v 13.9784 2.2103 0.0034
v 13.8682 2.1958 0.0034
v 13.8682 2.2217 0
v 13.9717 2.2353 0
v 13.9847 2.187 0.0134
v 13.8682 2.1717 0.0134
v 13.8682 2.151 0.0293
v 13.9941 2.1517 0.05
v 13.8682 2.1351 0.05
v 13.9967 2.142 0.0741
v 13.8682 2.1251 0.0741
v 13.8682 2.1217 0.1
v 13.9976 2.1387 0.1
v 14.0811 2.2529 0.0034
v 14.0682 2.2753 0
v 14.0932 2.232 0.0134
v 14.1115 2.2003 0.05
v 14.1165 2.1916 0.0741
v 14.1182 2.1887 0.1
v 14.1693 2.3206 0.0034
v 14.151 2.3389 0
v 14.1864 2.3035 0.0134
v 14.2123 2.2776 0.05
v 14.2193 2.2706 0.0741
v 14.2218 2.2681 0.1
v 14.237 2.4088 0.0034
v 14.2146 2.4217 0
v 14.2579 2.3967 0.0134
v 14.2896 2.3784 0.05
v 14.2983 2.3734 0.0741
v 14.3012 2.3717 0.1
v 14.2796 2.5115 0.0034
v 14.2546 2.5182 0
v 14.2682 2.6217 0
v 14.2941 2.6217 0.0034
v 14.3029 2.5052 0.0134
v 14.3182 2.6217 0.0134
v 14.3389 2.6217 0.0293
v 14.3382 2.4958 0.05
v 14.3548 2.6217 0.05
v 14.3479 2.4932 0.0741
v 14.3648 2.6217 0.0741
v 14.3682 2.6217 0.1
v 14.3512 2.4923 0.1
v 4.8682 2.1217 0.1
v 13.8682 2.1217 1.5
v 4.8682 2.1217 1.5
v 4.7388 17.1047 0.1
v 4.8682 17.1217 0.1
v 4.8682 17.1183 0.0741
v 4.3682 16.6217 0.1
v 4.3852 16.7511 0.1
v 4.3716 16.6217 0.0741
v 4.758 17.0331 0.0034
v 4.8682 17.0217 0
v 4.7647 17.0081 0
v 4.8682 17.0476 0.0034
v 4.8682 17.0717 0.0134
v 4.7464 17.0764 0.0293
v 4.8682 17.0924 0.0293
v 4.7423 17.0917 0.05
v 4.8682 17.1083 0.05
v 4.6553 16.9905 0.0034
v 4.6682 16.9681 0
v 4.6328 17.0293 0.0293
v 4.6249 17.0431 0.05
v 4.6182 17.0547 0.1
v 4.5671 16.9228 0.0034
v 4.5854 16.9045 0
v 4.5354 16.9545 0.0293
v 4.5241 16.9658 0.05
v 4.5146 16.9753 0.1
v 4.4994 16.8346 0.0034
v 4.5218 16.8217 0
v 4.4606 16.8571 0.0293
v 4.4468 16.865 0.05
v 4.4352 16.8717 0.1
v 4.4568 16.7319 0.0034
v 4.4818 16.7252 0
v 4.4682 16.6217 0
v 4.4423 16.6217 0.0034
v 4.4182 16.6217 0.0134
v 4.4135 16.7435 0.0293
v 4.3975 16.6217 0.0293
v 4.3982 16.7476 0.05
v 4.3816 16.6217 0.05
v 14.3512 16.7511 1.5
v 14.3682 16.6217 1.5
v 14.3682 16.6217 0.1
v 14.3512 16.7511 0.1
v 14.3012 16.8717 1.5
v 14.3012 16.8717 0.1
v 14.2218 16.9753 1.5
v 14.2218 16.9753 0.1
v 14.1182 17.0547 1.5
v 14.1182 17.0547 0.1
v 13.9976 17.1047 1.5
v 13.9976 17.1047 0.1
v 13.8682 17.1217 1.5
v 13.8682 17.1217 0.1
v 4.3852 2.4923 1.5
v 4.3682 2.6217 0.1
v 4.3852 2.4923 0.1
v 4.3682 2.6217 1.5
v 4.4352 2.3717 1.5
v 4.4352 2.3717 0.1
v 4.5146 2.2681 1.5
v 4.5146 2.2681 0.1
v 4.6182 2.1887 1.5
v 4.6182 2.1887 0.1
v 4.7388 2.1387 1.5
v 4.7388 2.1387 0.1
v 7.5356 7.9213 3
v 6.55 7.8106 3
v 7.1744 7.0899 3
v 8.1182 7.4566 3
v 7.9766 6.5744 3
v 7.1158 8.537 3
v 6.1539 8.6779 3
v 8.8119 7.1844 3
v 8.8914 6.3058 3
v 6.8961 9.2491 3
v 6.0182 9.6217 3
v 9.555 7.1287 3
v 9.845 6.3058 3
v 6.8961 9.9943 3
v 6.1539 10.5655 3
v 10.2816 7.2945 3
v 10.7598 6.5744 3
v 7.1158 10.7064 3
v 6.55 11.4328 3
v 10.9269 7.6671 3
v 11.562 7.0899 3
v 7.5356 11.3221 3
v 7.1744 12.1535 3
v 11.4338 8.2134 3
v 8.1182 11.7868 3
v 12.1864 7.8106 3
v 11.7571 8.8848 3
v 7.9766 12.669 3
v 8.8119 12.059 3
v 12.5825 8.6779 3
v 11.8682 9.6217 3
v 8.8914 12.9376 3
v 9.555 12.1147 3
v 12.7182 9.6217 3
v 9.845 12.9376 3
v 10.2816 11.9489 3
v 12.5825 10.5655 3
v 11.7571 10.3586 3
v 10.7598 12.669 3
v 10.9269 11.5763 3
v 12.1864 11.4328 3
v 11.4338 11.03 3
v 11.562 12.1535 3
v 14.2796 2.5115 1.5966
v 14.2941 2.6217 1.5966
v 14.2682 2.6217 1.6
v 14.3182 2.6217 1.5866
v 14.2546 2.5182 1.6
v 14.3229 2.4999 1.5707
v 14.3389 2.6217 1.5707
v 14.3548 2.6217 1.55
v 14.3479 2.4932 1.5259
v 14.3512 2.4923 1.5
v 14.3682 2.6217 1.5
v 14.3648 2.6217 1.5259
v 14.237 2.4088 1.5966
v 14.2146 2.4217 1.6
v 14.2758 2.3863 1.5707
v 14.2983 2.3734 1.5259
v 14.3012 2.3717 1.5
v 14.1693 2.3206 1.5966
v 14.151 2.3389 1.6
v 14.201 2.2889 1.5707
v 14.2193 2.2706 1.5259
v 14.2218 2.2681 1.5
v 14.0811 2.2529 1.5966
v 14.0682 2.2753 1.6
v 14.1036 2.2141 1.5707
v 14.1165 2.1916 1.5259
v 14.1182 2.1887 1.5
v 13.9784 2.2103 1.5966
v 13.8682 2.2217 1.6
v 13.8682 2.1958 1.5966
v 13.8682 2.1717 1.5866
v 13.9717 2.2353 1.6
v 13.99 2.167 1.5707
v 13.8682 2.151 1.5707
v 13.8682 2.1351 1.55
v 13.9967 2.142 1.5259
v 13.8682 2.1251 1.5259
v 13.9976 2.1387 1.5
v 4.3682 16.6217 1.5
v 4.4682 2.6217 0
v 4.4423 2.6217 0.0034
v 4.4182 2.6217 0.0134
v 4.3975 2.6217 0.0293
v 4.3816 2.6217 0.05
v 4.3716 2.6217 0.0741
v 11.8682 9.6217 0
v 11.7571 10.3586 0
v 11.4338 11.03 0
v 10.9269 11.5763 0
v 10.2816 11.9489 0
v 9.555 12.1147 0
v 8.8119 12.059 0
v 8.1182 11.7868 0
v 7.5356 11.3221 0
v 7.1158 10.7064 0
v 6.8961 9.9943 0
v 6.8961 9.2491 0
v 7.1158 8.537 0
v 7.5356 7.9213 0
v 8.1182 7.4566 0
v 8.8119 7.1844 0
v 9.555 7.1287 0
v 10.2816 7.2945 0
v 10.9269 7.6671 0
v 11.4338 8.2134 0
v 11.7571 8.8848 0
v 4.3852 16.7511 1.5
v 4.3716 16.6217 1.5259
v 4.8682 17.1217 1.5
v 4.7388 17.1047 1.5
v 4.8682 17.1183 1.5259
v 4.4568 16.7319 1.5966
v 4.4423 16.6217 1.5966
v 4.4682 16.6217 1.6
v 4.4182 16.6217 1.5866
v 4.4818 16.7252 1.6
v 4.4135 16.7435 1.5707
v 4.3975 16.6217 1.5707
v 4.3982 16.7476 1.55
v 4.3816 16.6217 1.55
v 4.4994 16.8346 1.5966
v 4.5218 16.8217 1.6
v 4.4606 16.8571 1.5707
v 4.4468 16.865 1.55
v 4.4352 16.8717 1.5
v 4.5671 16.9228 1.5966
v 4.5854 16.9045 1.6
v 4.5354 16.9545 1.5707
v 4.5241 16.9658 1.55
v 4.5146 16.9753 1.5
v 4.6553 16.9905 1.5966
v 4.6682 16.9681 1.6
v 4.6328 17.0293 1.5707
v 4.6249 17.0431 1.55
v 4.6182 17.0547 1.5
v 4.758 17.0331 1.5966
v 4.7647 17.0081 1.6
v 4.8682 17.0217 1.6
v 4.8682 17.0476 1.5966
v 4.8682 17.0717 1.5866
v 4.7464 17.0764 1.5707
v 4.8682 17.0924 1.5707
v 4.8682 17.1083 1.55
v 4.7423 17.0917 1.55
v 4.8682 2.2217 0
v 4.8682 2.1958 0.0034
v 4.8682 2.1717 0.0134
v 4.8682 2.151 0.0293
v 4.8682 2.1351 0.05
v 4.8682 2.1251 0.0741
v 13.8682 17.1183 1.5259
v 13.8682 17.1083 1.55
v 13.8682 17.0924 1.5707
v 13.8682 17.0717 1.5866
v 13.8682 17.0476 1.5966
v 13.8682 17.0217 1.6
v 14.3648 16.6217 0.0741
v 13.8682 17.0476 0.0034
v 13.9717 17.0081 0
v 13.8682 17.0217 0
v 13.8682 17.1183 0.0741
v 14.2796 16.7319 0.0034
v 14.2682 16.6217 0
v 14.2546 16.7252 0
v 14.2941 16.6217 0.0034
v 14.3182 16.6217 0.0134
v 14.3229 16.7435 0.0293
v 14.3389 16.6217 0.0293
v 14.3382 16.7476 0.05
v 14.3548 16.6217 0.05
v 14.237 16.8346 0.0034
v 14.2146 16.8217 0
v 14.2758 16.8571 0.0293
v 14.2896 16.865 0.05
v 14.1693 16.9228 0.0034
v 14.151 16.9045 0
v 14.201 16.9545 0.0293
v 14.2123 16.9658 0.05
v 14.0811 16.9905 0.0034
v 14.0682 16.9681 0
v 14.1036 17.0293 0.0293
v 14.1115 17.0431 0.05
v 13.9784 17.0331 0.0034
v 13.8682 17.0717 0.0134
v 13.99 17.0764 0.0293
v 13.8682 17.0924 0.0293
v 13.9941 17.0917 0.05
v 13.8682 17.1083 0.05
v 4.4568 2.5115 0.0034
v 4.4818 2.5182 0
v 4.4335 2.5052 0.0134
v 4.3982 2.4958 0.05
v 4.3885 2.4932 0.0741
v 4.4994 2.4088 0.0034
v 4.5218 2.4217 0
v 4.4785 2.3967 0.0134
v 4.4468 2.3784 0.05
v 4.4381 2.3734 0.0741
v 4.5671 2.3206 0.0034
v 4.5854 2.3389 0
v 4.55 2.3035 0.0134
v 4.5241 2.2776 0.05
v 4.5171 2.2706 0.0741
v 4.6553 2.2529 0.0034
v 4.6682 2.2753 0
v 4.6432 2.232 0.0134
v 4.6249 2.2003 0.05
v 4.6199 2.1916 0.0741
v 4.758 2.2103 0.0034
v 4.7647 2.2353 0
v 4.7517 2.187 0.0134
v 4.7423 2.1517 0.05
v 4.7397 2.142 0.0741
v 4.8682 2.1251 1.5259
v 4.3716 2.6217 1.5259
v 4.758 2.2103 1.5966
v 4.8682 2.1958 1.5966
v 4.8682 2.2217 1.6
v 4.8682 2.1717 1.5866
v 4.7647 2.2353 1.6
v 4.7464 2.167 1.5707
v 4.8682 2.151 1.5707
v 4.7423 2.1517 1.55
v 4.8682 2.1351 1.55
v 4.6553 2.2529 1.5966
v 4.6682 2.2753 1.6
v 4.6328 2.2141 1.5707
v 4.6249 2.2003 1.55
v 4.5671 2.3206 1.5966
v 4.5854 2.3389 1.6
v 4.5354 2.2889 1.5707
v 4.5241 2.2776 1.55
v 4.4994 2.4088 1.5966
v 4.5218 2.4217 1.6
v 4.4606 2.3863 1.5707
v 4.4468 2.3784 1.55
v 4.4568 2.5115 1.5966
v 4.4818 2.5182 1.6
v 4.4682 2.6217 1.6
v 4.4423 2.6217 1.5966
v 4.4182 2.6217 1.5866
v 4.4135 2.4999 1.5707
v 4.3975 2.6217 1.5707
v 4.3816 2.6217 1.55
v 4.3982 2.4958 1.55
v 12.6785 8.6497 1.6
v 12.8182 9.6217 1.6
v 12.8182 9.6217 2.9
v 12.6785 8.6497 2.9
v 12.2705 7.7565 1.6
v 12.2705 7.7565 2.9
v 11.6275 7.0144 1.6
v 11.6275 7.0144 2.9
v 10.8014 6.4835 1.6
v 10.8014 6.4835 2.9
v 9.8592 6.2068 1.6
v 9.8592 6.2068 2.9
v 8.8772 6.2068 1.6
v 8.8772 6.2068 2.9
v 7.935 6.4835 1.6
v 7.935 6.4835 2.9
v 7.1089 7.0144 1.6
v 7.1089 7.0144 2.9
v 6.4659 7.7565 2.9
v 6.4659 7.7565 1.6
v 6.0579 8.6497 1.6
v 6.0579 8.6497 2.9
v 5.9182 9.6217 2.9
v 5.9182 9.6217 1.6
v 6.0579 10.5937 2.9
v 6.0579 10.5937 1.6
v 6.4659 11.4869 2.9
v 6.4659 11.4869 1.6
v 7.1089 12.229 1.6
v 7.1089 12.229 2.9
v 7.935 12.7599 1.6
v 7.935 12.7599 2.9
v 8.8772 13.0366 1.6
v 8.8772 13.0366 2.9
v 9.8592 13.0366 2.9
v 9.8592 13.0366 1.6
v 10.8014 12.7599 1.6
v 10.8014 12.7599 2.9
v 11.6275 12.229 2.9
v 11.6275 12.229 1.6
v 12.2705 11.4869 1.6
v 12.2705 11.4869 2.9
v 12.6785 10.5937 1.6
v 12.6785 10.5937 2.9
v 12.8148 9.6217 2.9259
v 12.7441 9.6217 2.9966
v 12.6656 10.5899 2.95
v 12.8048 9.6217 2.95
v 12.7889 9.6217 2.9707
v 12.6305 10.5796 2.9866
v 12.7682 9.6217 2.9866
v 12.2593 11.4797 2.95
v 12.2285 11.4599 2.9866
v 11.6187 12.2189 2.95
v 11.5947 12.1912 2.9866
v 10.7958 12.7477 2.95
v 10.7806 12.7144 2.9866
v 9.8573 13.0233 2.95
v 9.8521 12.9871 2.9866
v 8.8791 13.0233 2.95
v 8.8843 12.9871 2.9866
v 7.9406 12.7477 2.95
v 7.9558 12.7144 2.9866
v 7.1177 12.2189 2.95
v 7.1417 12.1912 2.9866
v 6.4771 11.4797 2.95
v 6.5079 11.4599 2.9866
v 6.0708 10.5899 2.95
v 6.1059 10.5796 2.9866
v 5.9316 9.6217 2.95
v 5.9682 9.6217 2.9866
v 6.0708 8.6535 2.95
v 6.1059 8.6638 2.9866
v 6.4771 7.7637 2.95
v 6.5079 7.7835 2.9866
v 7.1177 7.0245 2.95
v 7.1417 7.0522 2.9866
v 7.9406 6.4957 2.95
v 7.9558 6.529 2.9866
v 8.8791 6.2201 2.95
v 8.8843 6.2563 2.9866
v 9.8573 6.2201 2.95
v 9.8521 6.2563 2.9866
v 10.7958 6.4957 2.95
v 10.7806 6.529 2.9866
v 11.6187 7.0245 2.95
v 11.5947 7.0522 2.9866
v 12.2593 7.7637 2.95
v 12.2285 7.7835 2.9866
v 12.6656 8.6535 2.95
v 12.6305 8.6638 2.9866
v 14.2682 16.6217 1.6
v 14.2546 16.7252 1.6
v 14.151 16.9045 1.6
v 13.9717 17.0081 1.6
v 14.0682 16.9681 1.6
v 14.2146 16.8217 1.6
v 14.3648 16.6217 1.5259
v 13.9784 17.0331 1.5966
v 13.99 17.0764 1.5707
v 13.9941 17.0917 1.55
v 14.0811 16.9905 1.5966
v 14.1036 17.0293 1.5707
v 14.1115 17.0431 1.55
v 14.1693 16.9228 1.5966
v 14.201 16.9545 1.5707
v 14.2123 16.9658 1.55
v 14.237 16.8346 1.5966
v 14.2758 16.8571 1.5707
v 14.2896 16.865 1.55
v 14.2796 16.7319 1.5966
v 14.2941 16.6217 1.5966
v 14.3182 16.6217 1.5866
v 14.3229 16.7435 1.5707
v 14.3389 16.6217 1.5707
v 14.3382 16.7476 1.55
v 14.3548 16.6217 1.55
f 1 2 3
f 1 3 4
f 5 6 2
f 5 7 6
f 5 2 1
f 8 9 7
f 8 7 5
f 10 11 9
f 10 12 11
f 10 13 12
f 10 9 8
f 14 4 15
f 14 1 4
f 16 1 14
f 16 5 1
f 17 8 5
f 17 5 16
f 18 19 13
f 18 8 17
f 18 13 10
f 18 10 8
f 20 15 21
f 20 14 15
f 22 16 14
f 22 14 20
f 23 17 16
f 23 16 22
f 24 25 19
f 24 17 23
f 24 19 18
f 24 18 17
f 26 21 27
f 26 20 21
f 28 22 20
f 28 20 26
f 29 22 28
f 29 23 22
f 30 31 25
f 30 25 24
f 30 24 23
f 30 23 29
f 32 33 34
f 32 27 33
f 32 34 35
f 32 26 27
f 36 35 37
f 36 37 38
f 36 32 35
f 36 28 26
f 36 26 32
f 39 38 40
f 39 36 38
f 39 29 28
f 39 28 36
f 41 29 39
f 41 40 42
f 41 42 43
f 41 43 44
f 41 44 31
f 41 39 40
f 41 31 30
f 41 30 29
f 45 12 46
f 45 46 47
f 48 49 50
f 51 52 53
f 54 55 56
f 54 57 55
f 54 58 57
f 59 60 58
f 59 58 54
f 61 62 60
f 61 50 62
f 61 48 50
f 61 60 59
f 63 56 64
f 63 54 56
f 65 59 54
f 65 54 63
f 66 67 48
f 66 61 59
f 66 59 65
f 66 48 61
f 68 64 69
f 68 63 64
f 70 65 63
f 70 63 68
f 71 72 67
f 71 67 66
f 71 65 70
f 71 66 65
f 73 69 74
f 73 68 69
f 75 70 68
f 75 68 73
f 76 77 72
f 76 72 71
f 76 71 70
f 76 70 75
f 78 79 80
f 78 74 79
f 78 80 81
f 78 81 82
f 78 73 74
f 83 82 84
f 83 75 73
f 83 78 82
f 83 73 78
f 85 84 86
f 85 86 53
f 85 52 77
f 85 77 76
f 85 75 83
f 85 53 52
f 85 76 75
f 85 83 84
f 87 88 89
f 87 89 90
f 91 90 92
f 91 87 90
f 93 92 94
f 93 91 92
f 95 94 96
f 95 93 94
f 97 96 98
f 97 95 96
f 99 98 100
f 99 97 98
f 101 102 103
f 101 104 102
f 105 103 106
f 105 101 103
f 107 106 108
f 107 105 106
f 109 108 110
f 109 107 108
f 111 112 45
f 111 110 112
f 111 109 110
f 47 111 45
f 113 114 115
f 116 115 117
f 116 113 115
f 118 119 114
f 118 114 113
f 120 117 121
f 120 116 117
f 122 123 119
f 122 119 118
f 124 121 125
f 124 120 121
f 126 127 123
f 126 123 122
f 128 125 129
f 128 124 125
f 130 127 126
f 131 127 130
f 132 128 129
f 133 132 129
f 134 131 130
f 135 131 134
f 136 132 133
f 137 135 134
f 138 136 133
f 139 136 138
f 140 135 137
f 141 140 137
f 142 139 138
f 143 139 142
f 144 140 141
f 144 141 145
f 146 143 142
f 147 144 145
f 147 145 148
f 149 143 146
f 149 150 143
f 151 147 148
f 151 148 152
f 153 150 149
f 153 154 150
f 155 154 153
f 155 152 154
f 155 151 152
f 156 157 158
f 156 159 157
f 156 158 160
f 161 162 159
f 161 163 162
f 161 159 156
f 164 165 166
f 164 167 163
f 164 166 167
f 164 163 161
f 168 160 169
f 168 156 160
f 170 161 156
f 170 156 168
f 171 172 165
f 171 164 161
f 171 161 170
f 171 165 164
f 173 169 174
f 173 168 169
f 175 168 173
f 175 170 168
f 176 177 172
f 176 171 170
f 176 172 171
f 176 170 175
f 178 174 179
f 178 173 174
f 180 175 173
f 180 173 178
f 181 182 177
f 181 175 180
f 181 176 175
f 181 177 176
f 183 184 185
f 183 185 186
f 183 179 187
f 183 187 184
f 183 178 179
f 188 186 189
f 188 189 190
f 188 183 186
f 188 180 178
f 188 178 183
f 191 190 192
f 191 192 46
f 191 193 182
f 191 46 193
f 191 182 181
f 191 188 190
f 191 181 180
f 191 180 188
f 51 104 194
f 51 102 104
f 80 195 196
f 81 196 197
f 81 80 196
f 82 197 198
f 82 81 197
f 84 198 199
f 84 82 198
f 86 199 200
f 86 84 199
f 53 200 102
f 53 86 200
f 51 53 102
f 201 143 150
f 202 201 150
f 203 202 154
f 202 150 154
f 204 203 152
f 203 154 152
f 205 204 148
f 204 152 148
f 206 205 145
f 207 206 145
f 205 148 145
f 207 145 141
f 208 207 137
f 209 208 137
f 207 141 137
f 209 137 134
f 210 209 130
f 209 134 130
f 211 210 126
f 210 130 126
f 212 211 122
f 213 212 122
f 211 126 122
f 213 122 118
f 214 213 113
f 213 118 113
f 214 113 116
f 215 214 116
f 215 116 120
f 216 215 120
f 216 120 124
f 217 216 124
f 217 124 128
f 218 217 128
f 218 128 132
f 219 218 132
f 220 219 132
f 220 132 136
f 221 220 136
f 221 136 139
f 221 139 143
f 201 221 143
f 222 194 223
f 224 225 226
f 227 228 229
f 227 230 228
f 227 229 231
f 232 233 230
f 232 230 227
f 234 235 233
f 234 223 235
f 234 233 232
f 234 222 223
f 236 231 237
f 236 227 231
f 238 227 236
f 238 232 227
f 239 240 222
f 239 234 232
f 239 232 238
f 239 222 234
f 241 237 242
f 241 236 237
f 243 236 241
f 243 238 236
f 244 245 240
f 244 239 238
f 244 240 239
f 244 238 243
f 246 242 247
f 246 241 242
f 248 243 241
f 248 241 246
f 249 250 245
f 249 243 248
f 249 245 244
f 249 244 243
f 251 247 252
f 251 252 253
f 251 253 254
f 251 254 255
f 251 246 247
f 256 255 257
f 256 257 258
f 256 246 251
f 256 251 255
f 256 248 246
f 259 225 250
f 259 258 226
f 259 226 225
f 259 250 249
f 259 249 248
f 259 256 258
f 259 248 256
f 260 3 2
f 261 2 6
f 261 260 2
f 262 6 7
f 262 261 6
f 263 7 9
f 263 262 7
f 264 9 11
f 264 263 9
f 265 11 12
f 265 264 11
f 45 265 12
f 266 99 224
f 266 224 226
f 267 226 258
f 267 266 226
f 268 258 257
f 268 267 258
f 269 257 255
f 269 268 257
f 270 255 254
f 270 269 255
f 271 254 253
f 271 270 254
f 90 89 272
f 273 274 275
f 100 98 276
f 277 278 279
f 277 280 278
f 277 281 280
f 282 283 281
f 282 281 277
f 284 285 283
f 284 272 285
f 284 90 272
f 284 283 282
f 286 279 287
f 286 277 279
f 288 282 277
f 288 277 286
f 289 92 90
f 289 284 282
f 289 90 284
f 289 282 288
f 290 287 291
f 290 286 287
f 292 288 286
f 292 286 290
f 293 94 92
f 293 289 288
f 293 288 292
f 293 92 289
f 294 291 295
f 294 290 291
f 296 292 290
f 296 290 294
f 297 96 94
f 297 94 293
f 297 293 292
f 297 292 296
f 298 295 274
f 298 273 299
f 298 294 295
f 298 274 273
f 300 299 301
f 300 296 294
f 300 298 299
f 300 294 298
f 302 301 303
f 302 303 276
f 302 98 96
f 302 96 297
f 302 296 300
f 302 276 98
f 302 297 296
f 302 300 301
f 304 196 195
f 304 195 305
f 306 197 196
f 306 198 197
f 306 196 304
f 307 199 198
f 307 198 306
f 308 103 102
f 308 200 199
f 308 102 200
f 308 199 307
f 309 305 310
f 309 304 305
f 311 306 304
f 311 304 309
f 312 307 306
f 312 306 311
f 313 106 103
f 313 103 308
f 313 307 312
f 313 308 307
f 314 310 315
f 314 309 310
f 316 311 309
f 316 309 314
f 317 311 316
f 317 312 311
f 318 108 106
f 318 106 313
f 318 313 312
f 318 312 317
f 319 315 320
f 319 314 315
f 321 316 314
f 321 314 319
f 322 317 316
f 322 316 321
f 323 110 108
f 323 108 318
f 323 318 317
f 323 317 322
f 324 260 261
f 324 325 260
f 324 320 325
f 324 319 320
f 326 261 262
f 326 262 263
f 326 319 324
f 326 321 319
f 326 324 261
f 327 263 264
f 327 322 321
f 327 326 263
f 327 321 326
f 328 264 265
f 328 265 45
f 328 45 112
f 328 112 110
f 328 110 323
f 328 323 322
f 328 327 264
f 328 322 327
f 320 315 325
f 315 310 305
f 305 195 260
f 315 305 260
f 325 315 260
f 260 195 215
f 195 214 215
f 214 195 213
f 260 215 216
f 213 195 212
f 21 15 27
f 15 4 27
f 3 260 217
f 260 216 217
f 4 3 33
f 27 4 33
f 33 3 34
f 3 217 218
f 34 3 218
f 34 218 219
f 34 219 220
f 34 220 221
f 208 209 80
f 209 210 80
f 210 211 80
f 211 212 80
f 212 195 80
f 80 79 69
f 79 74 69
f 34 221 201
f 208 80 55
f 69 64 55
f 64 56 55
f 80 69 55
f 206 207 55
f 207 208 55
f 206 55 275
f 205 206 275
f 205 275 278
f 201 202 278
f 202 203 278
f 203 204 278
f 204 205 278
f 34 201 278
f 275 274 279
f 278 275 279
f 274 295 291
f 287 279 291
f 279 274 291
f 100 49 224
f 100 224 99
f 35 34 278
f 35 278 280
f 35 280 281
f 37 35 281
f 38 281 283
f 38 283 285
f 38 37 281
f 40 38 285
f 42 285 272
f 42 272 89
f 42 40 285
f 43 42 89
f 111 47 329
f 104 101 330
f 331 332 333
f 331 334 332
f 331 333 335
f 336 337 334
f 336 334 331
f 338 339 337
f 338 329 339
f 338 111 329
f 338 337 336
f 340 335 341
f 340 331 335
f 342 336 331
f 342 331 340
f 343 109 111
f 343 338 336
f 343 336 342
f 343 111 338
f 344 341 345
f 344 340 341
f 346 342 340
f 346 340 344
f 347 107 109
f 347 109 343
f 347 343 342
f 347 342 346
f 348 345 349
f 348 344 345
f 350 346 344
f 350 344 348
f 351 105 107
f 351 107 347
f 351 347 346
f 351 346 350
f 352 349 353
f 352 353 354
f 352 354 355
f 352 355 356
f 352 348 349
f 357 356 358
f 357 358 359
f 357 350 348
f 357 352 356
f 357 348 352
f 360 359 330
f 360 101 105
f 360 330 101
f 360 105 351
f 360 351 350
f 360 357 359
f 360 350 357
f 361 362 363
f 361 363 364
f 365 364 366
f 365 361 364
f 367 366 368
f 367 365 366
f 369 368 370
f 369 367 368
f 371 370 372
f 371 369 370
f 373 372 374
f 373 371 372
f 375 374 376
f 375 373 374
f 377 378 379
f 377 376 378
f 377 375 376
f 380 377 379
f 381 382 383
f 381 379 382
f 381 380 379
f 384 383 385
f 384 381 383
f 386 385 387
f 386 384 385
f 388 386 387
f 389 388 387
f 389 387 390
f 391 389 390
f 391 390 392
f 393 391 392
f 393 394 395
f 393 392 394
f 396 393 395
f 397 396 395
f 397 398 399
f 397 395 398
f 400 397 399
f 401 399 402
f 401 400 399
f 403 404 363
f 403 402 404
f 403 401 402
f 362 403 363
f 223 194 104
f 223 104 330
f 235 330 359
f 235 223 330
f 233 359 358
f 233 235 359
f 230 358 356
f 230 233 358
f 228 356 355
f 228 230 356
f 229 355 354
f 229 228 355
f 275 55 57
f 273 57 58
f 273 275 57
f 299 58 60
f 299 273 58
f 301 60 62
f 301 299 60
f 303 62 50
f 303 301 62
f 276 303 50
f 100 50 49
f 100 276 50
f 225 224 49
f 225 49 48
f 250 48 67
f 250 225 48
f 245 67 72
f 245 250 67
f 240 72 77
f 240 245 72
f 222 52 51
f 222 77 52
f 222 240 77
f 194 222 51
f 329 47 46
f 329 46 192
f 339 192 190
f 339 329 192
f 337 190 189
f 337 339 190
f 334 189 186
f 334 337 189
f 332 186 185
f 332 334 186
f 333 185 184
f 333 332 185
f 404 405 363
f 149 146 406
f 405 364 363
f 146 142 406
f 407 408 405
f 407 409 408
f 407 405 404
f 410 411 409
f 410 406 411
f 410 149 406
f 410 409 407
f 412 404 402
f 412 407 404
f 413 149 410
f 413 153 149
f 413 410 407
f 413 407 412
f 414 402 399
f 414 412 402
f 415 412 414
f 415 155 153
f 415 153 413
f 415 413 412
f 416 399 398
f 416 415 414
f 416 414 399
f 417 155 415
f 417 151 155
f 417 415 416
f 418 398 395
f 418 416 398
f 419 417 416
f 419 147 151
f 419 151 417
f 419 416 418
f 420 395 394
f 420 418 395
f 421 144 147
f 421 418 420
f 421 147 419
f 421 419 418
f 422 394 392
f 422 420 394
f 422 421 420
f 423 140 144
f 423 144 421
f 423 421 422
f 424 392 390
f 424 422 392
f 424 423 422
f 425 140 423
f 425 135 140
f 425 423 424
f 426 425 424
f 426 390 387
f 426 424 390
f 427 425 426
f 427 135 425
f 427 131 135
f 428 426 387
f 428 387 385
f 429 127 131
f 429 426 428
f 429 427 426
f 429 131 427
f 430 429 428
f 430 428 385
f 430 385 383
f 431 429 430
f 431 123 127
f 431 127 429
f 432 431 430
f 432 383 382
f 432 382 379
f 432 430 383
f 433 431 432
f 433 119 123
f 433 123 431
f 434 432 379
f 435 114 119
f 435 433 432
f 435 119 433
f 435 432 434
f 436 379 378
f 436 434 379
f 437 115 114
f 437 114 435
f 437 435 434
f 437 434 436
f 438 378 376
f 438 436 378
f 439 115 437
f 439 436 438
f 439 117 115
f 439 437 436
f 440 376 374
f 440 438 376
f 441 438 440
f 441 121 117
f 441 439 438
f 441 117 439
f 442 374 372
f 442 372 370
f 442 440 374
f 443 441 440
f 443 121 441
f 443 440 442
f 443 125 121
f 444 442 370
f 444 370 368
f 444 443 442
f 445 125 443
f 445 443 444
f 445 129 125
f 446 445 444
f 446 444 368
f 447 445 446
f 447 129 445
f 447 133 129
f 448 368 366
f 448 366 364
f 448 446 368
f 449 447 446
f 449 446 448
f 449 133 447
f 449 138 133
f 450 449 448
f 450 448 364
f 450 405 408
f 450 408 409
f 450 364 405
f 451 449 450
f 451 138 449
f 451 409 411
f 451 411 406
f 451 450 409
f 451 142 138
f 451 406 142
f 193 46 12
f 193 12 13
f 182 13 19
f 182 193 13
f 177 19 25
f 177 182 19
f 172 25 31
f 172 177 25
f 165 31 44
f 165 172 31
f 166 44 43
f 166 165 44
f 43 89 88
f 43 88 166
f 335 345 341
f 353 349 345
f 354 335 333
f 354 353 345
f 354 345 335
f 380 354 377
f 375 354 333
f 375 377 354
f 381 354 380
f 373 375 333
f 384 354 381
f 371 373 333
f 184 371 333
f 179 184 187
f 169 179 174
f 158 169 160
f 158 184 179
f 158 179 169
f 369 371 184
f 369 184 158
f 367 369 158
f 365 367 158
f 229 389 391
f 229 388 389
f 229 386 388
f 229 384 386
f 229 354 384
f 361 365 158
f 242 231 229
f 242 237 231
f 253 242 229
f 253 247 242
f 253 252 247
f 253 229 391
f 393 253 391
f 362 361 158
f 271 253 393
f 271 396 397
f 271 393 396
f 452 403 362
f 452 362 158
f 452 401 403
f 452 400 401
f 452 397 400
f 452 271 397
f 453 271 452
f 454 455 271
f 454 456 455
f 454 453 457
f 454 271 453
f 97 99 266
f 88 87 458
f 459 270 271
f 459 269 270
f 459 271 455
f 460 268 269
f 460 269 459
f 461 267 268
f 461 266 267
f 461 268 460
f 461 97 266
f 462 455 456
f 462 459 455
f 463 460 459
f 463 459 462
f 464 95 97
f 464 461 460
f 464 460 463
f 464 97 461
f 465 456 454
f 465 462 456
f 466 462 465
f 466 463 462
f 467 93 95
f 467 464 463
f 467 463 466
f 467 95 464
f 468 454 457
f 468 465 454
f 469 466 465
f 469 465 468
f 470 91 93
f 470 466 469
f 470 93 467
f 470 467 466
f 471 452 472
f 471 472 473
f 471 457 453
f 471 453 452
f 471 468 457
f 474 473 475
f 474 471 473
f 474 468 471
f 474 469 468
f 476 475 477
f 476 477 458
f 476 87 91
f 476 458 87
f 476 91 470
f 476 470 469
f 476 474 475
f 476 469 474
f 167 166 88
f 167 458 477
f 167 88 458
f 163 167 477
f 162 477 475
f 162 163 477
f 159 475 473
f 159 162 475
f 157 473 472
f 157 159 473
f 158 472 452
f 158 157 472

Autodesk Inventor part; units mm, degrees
ref_plane "YZ Plane" through (0, 0, 0) normal (1, 0, 0) x (0, 1, 0)
ref_plane "XZ Plane" through (0, 0, 0) normal (0, 1, 0) x (-1, 0, 0)
ref_plane "XY Plane" through (0, 0, 0) normal (0, 0, 1) x (1, 0, 0)
sketch "Sketch1" plane through (0, 0, 0) normal (0, 0, 1) x (1, 0, 0)
  line L0 (4.3682, 17.1217) -> (14.3682, 17.1217)
  line L1 (14.3682, 17.1217) -> (14.3682, 2.1217)
  line L2 (14.3682, 2.1217) -> (4.3682, 2.1217)
  line L3 (4.3682, 2.1217) -> (4.3682, 17.1217)
  dimension "d0" = 10
  dimension "d1" = 15
extrude "Extrusion1" add sketch "Sketch1" along normal blind 1.6
sketch "Sketch2" plane through (0, 0, 1.6) normal (0, 0, 1) x (1, 0, 0)
  line L0 (4.3682, 17.1217) -> (14.3682, 17.1217) projected
  line L1 (4.3682, 2.1217) -> (4.3682, 17.1217) projected
  circle A0 centre (9.3682, 9.6217) radius 3.45
  dimension "d4" = 6.9
  dimension "d5" = 5
  dimension "d6" = 7.5
extrude "Extrusion2" add sketch "Sketch2" along normal blind 1.4
sketch "Sketch3" plane through (9.3682, 9.6217, 3) normal (0, 0, 1) x (1, 0, 0)
  circle A0 centre (0, 0) radius 3.45 projected
  circle A1 centre (0, 0) radius 2.5
  dimension "d9" = 5
extrude "Extrusion3" cut sketch "Sketch3" against normal through all contours A1
fillet "Fillet1" radius 0.5 4 edges at (14.3682, 17.1217, 0.8) (14.3682, 2.1217, 0.8) (4.3682, 2.1217, 0.8) (4.3682, 17.1217, 0.8)
fillet "Fillet2" radius 0.1 17 edges at (5.9182, 9.6217, 3) (14.3682, 9.6217, 1.6) (14.2217, 2.2681, 1.6) (9.3682, 2.1217, 1.6) (4.5146, 2.2681, 1.6) (4.3682, 9.6217, 1.6) (4.5146, 16.9752, 1.6) (9.3682, 17.1217, 1.6) (14.2217, 16.9752, 1.6) (14.3682, 9.6217, 0) (14.2217, 2.2681, 0) (9.3682, 2.1217, 0) (4.5146, 2.2681, 0) (4.3682, 9.6217, 0) (4.5146, 16.9752, 0) (9.3682, 17.1217, 0) (14.2217, 16.9752, 0)
properties part number "SM-H11" material "Steel, Mild"
